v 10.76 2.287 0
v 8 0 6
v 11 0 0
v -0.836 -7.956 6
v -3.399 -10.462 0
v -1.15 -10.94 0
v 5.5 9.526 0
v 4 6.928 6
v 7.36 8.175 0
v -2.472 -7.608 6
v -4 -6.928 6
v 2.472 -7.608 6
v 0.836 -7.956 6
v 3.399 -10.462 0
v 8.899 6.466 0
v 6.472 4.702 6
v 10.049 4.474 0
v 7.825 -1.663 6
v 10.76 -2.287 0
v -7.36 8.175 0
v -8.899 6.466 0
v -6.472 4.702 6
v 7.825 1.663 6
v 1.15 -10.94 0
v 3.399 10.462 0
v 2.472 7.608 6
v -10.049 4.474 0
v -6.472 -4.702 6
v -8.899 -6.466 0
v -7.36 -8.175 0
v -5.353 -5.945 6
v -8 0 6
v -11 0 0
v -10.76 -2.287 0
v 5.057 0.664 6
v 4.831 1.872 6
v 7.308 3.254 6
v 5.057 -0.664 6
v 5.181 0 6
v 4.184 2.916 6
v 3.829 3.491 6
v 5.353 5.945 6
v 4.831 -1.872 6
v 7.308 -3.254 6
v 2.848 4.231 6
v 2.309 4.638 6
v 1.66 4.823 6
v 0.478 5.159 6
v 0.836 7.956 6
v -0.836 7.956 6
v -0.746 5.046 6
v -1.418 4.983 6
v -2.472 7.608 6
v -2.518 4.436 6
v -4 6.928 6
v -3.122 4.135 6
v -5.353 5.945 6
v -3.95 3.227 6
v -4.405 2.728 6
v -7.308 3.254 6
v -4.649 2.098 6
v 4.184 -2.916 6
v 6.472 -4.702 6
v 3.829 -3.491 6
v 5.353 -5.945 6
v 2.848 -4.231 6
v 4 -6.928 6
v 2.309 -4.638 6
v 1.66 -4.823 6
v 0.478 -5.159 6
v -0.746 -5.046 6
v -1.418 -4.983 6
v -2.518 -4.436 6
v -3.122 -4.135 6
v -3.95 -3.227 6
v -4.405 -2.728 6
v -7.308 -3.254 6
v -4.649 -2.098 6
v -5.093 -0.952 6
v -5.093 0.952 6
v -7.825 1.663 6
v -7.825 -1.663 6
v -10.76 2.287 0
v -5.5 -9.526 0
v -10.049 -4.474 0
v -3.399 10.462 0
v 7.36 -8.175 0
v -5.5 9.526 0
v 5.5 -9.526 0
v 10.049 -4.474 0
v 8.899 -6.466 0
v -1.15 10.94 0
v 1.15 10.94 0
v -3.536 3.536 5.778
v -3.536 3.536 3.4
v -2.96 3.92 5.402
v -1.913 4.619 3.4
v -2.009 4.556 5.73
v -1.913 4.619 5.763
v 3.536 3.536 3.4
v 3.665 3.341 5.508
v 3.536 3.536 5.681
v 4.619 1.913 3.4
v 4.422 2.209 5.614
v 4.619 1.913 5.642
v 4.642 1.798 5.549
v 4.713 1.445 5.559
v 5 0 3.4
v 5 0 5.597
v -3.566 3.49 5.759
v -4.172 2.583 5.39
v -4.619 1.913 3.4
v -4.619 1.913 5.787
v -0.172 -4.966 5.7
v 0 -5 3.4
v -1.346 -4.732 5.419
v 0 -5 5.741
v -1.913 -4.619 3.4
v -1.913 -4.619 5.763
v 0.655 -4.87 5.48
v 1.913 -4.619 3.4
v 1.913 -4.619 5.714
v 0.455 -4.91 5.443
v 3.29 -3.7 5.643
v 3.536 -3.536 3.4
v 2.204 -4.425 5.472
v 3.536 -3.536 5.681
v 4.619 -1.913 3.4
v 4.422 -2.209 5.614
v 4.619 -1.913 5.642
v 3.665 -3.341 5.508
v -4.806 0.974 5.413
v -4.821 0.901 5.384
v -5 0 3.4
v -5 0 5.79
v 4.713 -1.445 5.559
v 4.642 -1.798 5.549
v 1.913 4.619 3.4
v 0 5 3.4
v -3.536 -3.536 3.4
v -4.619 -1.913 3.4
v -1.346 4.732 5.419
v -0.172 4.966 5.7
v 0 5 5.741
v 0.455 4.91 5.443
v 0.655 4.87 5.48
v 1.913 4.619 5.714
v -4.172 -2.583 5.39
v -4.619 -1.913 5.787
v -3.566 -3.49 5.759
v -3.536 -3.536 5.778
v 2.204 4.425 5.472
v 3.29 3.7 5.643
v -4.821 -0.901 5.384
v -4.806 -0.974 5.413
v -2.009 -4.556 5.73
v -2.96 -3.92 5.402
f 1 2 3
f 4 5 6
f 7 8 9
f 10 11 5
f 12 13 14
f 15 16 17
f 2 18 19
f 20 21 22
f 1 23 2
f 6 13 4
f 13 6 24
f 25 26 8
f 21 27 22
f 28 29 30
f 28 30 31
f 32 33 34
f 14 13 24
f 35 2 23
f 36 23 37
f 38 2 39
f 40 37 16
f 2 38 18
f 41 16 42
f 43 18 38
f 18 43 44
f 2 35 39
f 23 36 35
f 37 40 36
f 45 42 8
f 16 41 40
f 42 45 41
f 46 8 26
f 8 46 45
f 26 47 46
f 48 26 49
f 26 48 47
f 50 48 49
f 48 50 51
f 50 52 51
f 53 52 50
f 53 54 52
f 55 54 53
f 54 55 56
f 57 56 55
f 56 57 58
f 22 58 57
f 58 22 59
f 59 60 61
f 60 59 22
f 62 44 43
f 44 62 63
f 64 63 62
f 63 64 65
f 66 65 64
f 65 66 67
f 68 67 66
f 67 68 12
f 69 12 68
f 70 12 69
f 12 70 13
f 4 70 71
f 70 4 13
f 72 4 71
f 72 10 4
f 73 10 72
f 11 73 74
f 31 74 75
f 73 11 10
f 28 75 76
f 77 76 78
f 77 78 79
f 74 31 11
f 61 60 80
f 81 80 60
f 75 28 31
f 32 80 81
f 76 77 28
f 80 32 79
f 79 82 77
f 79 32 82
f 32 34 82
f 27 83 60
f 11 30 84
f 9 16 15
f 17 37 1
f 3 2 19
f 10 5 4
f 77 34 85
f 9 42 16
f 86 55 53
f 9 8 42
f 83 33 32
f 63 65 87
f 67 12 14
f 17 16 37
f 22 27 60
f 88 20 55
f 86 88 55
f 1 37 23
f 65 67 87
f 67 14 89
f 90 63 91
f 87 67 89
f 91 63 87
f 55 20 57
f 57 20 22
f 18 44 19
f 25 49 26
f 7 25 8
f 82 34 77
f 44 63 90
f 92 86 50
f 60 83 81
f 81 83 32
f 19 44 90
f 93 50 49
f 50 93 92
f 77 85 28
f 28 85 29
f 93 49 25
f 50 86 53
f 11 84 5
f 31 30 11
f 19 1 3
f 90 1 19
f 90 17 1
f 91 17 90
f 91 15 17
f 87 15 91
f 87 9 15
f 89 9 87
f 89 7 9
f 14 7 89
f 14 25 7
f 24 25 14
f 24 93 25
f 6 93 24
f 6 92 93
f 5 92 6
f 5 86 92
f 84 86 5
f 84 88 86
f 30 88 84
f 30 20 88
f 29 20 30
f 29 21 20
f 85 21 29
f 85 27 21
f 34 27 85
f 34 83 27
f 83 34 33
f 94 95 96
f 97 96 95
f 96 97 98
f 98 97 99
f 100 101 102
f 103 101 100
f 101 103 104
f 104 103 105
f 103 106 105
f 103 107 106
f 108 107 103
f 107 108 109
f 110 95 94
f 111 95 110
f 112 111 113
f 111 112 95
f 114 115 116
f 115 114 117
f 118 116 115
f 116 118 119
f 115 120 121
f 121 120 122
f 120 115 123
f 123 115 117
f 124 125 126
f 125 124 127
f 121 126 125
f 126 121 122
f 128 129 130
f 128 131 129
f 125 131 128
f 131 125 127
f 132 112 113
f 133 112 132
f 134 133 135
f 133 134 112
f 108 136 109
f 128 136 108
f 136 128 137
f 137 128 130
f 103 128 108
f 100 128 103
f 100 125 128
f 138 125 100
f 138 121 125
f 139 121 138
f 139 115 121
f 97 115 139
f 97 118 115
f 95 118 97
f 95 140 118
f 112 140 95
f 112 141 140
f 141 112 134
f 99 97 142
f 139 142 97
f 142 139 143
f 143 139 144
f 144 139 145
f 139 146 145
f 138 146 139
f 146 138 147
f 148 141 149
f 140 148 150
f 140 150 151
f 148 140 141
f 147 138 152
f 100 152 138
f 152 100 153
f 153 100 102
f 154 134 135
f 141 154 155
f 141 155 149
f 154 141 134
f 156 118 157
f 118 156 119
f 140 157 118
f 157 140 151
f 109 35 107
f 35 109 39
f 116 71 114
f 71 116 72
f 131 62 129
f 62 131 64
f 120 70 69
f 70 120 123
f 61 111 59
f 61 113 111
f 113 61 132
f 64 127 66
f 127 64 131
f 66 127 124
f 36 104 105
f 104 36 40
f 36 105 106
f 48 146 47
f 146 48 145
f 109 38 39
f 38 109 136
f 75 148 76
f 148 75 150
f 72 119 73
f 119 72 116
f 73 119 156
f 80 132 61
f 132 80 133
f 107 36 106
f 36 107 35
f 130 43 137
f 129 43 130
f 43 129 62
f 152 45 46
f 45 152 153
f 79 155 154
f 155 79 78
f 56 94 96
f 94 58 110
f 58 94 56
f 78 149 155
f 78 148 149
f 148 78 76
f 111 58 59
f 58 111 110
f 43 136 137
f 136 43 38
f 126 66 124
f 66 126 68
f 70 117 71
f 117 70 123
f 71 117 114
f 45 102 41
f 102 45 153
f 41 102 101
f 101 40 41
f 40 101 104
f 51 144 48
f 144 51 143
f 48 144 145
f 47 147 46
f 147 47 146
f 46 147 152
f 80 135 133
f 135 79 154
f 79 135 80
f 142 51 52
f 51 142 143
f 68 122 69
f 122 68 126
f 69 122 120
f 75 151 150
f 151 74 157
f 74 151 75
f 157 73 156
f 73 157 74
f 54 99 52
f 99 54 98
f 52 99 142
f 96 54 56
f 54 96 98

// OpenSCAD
// [FL_INDEX: keywords="openscad, 3d_parametric, Another_Refrigerator_Magnet, csg_solid" | COT="Parametric OpenSCAD design from 3DCodeverse"]
// Title: Another Refrigerator Magnet

// Refrigerator Magnet.  
// Uses a neodymium disk magnet.
// Tapered 60 degrees towards magnetic side so it's easy to remove.
//
// Magnet socket is a hair deeper to allow for a drop of glue
//
//  Mooselake 21 Mar 2013
//

// Magnet Diameter
Dmagnet = 10.0;

// Magnet Thickness
Hmagnet = 2.5;

// Top Diameter of holder (out side)
Dtop = 22;

// Bottom Diameter of holder (Refrigerator side), must be bigger than magnet.
Dbot = 16;


// Thickness of holder
Hholder = 6;


Rmagnet = Dmagnet/2;
Rbot    = Dbot/2;
Rtop    = Dtop/2;

// print upside down, magnet cutout on top

difference() {
	cylinder(h = Hholder, r1 = Rtop, r2 = Rbot);		// holder
	translate([0,0,Hholder-Hmagnet-0.1])
		cylinder(h=Hmagnet+0.1, r=Rmagnet);			// magnet hole
	translate([0,0,Hholder-(Hmagnet*0.25)])
		cylinder(h=1, r1=Rmagnet*0.98, r2=Rmagnet*1.07);  // chamfered for easy insertion
	}
